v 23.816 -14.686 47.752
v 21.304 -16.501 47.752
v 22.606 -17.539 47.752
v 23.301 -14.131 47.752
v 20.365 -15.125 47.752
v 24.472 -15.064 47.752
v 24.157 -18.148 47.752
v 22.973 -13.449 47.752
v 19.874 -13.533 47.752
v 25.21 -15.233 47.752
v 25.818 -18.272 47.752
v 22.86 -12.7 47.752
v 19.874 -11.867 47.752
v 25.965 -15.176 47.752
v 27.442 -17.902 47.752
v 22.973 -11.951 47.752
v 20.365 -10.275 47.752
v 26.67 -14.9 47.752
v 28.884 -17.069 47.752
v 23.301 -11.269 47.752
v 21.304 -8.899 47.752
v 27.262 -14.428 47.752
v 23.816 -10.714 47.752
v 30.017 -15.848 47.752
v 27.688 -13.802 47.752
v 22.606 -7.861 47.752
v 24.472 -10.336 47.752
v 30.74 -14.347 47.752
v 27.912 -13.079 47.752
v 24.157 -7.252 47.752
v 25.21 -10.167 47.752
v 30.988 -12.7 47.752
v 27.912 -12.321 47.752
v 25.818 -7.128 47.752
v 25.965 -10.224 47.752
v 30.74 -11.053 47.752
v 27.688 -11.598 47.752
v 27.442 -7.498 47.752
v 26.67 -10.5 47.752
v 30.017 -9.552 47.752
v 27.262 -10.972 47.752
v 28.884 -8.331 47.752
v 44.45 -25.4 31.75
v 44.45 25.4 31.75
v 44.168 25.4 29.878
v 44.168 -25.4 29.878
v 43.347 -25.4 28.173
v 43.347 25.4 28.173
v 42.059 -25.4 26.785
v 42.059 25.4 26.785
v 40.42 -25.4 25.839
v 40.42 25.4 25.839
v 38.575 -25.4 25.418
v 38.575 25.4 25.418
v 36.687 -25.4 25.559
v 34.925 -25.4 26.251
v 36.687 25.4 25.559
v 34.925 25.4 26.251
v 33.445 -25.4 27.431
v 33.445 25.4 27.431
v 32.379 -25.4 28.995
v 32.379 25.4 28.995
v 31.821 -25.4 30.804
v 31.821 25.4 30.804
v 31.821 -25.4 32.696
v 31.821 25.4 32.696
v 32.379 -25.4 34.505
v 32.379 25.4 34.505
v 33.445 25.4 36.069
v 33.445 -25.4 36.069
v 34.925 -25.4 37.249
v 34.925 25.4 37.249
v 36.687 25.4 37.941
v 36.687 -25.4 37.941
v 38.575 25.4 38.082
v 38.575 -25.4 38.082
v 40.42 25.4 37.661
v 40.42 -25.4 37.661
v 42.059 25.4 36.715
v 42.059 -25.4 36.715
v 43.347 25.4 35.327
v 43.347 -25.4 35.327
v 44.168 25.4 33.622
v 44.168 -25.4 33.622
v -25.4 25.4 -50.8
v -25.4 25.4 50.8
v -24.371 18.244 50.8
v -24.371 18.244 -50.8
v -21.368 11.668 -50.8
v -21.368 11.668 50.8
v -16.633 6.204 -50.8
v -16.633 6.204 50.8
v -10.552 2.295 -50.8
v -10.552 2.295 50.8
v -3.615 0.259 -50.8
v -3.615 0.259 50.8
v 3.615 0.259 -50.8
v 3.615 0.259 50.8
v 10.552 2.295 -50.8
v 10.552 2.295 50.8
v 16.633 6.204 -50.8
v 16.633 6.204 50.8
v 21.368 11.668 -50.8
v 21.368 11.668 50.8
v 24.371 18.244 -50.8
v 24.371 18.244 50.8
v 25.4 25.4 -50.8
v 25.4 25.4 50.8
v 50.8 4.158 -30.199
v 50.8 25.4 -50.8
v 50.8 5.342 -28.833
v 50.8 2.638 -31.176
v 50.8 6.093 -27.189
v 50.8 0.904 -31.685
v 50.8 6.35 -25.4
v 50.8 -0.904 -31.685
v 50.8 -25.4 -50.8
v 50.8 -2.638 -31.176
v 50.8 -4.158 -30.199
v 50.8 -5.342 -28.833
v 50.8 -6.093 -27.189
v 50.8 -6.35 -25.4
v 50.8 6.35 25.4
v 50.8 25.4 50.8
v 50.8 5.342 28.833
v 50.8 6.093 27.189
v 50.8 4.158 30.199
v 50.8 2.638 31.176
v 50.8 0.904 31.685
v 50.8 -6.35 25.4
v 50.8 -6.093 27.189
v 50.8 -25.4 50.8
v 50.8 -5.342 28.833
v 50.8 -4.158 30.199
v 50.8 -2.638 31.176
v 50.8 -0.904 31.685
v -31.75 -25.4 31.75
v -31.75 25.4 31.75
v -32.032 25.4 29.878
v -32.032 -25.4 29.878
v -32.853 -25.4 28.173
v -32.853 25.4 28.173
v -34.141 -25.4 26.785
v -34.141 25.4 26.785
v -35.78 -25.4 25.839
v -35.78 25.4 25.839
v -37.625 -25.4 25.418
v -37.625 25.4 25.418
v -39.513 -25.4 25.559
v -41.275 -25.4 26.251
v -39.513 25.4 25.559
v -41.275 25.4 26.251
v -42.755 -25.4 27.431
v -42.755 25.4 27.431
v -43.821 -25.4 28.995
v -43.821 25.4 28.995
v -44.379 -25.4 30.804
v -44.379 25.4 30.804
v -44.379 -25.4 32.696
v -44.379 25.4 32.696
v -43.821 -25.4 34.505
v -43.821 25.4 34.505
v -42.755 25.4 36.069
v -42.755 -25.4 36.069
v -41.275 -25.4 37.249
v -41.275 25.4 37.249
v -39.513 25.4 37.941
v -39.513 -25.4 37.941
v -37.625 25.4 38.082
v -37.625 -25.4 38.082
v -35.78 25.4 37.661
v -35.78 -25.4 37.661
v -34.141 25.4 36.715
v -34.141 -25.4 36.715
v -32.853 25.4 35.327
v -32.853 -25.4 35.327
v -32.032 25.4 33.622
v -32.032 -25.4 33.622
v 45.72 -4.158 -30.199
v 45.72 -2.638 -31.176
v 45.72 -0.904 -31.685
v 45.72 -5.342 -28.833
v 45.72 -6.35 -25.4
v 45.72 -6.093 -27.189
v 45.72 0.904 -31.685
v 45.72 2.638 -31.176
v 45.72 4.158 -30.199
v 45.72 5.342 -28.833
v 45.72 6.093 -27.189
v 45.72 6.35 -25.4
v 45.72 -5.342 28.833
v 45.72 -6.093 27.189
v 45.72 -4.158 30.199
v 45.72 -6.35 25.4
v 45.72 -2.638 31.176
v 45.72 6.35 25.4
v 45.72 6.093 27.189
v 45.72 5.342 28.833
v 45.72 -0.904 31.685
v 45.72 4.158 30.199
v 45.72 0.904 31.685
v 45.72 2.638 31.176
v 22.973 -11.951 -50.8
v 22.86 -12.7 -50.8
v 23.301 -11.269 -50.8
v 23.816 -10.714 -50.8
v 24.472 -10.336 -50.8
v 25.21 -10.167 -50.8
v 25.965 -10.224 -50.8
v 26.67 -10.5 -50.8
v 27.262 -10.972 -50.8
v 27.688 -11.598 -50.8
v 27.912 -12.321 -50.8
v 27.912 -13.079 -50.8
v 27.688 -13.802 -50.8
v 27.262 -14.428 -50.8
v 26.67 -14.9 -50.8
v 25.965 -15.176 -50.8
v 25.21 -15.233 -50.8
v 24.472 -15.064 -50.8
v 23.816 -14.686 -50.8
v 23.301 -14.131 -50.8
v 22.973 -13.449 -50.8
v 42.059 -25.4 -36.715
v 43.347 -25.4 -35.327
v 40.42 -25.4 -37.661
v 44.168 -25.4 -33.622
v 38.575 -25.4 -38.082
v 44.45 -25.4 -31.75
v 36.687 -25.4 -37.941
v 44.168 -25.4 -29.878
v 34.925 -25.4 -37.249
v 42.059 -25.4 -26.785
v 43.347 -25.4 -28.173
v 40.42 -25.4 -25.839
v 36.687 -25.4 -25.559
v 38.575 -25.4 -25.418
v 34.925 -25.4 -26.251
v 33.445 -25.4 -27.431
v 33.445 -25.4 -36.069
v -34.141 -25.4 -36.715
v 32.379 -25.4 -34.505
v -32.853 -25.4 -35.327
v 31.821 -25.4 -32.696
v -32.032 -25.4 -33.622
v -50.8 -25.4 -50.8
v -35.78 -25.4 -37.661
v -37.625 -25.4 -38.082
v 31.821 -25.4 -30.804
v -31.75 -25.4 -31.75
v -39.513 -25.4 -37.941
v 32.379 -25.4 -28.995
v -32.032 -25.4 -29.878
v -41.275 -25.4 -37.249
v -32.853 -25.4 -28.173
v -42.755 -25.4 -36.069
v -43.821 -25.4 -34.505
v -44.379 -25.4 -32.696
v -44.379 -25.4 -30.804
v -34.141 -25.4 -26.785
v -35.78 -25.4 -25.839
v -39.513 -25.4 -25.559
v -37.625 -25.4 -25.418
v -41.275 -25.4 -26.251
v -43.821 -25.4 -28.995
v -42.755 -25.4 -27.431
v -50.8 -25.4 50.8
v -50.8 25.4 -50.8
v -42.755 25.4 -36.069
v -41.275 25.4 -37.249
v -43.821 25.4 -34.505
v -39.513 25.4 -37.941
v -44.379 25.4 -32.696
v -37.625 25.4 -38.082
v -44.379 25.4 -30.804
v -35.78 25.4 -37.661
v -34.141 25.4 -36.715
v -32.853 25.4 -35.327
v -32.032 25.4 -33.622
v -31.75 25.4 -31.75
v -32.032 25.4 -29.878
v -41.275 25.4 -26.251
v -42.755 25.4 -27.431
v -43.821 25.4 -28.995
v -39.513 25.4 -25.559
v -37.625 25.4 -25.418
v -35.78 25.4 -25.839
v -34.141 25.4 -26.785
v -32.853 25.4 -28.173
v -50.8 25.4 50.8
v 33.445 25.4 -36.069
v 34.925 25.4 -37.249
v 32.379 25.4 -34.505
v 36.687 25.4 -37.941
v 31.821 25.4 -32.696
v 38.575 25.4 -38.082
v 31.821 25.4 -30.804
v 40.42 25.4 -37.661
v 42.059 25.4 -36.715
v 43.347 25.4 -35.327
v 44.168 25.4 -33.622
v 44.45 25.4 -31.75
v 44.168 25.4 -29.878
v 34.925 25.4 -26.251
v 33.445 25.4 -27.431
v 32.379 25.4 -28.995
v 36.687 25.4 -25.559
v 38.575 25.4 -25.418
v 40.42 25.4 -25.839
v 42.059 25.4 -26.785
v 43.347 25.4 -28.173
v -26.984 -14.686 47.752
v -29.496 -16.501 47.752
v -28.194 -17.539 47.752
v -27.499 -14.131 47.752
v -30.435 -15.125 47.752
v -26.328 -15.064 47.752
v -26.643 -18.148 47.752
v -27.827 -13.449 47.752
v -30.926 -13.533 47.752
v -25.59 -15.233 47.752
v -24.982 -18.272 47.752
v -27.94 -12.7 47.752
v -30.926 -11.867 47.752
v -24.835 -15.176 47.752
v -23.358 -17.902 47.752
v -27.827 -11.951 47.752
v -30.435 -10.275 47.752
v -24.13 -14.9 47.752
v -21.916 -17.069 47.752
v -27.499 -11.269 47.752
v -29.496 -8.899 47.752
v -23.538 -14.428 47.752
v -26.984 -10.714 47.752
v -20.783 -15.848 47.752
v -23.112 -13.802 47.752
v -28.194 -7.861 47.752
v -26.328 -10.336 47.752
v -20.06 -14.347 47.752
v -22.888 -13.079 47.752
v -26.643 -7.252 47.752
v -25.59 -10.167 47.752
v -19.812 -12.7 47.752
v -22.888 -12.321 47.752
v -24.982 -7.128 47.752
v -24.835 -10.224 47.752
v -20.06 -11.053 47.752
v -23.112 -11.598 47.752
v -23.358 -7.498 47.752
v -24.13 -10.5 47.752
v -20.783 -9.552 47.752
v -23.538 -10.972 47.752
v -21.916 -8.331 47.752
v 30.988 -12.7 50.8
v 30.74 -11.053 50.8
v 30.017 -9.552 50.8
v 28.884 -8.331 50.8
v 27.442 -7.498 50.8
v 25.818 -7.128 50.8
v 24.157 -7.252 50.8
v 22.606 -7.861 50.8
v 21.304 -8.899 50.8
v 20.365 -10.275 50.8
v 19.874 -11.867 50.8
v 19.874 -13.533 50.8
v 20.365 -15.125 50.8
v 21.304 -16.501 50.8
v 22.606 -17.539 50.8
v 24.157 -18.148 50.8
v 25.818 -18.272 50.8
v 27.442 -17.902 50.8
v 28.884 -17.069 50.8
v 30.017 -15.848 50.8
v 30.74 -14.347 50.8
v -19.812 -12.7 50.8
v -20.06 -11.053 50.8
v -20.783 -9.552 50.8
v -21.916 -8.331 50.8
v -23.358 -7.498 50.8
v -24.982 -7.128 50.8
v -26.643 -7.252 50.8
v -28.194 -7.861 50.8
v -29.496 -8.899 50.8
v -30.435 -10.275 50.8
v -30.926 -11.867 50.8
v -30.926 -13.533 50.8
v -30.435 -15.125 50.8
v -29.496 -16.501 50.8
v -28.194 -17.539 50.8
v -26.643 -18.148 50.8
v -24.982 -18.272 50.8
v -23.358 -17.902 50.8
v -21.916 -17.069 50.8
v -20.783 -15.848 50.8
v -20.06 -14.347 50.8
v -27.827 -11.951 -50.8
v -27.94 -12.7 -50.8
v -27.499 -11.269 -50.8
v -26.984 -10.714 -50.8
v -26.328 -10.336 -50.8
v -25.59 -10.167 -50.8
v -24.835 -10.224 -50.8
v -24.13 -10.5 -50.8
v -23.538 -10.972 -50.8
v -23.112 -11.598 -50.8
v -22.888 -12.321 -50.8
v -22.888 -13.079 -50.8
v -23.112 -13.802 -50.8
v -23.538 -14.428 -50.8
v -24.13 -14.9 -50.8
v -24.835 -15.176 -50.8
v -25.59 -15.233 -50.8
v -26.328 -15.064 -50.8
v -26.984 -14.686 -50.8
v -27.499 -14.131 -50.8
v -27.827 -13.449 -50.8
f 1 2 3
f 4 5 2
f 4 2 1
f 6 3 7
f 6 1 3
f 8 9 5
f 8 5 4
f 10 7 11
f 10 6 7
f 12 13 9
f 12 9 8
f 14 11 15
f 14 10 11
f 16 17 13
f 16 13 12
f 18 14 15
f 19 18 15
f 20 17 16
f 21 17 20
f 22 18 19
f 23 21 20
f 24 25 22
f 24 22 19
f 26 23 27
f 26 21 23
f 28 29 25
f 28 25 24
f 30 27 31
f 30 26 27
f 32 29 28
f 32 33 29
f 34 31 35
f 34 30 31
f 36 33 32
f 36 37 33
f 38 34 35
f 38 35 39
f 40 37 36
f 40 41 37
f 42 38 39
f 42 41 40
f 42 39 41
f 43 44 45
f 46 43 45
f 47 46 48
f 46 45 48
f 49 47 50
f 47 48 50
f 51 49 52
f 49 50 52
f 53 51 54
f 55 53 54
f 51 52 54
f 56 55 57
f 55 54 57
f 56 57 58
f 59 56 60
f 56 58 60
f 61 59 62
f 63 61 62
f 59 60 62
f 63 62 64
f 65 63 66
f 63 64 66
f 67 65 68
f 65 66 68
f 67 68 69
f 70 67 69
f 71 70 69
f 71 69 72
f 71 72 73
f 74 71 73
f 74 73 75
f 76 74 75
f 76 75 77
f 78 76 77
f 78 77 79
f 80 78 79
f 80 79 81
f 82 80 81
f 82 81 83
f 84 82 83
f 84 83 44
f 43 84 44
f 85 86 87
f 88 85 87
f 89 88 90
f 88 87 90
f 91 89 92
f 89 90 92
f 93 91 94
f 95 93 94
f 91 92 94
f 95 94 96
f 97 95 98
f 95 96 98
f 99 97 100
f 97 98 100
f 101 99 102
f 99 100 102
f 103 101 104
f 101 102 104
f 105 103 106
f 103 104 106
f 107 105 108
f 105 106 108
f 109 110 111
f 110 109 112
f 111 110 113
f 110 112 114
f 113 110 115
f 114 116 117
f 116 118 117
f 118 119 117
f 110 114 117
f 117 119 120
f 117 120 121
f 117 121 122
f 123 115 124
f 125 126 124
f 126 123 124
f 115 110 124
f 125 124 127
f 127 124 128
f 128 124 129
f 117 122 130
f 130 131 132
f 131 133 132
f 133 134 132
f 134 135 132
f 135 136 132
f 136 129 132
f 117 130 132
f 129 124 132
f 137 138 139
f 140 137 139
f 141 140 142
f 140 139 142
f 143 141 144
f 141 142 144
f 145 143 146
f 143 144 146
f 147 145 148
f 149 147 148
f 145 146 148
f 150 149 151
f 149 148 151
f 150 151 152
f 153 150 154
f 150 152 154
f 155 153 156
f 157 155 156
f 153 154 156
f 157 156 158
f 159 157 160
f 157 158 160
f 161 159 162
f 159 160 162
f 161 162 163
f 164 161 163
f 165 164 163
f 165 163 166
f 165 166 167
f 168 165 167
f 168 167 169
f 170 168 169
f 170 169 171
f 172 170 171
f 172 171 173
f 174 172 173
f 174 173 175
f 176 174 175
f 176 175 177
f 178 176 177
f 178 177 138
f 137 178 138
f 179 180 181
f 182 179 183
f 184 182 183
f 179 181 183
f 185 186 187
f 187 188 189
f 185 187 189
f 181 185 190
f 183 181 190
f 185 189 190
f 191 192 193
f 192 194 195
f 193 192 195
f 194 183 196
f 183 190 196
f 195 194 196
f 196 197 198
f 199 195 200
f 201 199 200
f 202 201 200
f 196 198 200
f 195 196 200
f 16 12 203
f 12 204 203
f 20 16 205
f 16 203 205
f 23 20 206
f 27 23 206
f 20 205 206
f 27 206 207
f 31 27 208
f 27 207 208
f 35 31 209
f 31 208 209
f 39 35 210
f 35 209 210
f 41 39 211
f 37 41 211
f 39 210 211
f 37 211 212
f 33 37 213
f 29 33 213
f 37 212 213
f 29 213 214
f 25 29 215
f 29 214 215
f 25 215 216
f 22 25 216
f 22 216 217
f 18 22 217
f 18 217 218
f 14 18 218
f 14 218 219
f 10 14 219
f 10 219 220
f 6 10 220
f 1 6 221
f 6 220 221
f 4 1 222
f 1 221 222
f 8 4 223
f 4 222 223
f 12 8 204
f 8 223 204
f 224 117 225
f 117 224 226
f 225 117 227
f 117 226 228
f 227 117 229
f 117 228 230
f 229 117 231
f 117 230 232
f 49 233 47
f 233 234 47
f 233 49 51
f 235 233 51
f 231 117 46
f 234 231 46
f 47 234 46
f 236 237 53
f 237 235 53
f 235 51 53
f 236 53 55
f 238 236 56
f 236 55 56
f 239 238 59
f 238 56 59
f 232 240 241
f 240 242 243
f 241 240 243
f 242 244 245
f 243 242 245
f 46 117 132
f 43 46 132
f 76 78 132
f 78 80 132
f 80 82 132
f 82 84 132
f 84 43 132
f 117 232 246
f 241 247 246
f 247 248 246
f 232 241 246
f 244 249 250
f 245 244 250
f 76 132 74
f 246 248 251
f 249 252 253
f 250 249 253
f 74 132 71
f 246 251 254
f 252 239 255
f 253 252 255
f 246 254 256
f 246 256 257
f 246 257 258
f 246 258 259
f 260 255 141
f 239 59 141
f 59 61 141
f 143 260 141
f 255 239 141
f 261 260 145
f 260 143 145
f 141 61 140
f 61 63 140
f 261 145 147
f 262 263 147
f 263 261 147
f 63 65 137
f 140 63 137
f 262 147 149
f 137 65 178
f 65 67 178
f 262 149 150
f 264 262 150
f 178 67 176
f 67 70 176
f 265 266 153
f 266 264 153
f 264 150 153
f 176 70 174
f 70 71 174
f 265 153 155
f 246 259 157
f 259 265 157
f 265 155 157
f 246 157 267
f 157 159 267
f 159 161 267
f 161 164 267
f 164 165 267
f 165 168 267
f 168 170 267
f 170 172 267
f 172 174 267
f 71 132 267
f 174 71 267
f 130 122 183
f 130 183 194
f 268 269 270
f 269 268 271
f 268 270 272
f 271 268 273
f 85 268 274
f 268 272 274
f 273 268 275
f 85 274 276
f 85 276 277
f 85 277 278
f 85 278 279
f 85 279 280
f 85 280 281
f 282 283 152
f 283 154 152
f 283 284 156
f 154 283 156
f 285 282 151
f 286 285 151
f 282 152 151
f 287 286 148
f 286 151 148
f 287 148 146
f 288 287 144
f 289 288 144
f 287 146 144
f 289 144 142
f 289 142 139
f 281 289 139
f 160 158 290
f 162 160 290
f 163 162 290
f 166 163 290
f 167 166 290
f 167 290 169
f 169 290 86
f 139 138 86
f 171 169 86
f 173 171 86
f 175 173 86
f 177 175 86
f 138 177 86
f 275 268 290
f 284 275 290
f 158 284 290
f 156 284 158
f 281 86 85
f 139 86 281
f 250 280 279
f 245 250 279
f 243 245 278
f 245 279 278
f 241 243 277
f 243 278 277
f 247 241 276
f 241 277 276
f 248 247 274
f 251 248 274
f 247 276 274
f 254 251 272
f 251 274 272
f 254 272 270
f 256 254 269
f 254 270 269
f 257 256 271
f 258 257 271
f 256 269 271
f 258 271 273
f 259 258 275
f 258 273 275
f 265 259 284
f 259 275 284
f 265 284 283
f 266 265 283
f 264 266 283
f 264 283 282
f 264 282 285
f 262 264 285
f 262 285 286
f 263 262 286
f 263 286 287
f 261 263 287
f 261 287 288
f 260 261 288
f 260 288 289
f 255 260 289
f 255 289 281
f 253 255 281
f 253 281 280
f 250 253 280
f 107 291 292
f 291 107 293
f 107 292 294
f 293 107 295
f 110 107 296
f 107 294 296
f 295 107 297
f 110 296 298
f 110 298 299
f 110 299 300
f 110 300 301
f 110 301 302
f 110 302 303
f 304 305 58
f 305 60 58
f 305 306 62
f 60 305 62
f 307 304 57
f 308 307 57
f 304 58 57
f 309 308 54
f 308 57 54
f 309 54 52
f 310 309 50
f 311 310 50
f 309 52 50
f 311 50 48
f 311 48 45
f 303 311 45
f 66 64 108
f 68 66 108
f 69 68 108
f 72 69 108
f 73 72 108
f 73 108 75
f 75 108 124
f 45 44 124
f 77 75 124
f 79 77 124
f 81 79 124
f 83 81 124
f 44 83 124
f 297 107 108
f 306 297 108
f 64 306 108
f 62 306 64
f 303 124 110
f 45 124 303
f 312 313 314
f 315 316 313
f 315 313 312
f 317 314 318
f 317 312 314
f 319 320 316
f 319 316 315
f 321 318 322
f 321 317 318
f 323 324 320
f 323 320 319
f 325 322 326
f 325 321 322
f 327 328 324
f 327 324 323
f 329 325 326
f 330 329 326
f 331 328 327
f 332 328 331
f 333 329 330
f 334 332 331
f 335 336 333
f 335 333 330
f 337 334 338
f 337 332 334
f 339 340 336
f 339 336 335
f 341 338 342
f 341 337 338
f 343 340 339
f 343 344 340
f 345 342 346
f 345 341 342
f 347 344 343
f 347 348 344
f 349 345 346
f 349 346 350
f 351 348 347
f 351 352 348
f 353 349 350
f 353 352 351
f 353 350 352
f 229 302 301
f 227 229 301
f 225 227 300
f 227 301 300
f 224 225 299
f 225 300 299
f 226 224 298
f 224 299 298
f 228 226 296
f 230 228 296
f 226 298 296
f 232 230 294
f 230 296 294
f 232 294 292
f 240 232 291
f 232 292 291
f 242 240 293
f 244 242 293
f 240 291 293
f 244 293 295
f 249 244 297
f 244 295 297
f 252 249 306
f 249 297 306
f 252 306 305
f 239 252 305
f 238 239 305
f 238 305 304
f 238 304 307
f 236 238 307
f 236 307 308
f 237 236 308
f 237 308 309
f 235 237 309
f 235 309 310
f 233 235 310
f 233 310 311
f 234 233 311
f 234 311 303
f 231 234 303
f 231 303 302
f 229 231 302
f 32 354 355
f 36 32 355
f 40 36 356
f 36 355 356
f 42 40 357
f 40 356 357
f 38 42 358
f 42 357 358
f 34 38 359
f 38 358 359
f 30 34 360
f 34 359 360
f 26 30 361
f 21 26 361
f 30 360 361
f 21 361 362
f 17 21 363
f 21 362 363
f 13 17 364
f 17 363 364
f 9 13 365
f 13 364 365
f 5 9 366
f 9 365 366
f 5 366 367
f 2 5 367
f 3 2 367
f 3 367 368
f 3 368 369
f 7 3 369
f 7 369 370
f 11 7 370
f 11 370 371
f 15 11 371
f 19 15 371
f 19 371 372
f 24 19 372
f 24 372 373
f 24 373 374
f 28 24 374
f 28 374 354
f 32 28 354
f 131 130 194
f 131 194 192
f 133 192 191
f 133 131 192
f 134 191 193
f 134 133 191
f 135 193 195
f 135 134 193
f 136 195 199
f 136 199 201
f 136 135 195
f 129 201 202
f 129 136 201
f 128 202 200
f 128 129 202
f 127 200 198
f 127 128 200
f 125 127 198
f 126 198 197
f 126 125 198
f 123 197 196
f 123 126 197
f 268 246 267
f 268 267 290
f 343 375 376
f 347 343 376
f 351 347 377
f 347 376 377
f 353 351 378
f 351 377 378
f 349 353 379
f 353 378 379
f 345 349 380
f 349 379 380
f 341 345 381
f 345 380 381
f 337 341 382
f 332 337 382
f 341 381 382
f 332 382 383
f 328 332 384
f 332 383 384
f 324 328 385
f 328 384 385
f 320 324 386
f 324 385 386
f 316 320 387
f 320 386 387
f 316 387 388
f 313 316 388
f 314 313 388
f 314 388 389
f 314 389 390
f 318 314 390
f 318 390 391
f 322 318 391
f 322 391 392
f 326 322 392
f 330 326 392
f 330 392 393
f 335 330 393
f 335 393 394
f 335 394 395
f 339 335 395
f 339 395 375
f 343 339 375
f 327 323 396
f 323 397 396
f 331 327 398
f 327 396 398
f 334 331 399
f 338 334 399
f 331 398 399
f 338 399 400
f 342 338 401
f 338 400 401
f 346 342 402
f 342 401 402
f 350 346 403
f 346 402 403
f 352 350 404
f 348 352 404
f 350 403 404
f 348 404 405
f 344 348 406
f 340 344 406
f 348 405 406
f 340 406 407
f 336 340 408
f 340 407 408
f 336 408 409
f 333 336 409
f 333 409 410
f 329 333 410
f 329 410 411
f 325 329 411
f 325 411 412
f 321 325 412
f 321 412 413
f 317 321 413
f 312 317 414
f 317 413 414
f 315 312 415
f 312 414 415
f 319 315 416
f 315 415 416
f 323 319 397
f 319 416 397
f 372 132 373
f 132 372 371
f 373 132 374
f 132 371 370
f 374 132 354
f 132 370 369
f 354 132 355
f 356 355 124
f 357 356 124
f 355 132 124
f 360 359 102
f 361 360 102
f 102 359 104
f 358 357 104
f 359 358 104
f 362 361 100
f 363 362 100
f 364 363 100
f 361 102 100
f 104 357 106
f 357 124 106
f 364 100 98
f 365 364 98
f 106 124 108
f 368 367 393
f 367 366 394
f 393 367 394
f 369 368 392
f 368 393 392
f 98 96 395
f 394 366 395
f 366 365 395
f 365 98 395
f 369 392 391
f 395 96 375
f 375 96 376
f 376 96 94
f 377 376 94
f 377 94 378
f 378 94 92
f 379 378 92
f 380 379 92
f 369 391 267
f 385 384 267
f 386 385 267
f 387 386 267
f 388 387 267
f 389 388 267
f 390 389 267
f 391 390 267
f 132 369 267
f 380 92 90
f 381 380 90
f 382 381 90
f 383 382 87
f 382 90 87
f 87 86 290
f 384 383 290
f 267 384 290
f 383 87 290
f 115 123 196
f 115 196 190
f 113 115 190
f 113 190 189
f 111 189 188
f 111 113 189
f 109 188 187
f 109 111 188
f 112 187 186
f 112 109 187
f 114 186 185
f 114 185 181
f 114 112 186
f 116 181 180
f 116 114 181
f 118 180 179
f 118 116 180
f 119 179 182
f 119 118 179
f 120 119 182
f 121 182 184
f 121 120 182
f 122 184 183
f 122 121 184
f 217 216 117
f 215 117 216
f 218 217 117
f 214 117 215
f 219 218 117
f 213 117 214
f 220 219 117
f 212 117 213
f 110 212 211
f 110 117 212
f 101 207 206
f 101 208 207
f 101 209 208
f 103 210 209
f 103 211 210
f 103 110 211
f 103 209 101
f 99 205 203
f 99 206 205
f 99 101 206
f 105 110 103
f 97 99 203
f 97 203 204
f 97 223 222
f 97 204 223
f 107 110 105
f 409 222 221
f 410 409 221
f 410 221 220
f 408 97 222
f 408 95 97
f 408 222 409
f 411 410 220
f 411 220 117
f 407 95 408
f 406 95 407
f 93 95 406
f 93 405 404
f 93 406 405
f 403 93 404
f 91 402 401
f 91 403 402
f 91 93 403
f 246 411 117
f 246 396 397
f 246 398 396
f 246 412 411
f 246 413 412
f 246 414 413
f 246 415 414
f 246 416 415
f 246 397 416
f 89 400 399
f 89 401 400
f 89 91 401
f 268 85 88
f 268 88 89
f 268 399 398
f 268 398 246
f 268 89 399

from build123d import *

# Parameters (mm, degrees)
BOSS_EXTRUDE1_DEPTH                                 = 50.8
SKETCH2_R                                           = 6.35
CUT_EXTRUDE1_DEPTH                                  = 51.8
LPATTERN1_COUNT                                     = 2
LPATTERN1_PITCH                                     = 76.2
LPATTERN1_COUNT_DIR2                                = 2
LPATTERN1_PITCH_DIR2                                = 63.5
CBORE_FOR_00_BINDING_HEAD_MACHINE_SCREW_D           = 5.08
CBORE_FOR_00_BINDING_HEAD_MACHINE_SCREW_CBORE_D     = 11.176
CBORE_FOR_00_BINDING_HEAD_MACHINE_SCREW_CBORE_DEPTH = 3.048
CUT_EXTRUDE6_DEPTH                                  = 5.08


with BuildPart() as part:
    # Sketch1 → Boss-Extrude1 (new body, symmetric)
    with BuildSketch(Plane.XY):
        with BuildLine():
            Line((25.4, 25.4), (50.8, 25.4))
            Line((50.8, 25.4), (50.8, -25.4))
            Line((50.8, -25.4), (-50.8, -25.4))
            Line((-50.8, -25.4), (-50.8, 25.4))
            Line((-50.8, 25.4), (-25.4, 25.4))
            ThreePointArc((-25.4, 25.4), (0, 0), (25.4, 25.4))
        make_face()
    extrude(amount=BOSS_EXTRUDE1_DEPTH, both=True)

    # Sketch2 → Cut-Extrude1 (cut, through all)
    with BuildSketch(Plane(origin=(0, 25.4, 0), x_dir=(1, 0, 0), z_dir=(0, 1, 0))):
        with Locations((-38.1, 31.75)):
            Circle(SKETCH2_R)
    cut_extrude1 = extrude(amount=-CUT_EXTRUDE1_DEPTH, mode=Mode.SUBTRACT)

    # LPattern1: Cut-Extrude1 2 × 2
    with Locations(*[(i * LPATTERN1_PITCH, 0, j * LPATTERN1_PITCH_DIR2) for i in range(LPATTERN1_COUNT) for j in range(LPATTERN1_COUNT_DIR2) if (i, j) != (0, 0)]):
        add(cut_extrude1, mode=Mode.SUBTRACT)

    # CBORE for #00 Binding Head Machine Screw1 (through all)
    with Locations(Plane.XY.offset(50.8)):
        with Locations((-25.4, -12.7), (25.4, -12.7)):
            CounterBoreHole(CBORE_FOR_00_BINDING_HEAD_MACHINE_SCREW_D / 2, CBORE_FOR_00_BINDING_HEAD_MACHINE_SCREW_CBORE_D / 2, CBORE_FOR_00_BINDING_HEAD_MACHINE_SCREW_CBORE_DEPTH)

    # Sketch7 → Cut-Extrude6 (cut)
    with BuildSketch(Plane(origin=(50.8, 0, 0), x_dir=(0, 0, -1), z_dir=(1, 0, 0))):
        with BuildLine():
            Line((-25.4, 6.35), (25.4, 6.35))
            ThreePointArc((25.4, 6.35), (31.75, 0), (25.4, -6.35))
            Line((25.4, -6.35), (-25.4, -6.35))
            ThreePointArc((-25.4, -6.35), (-31.75, 0), (-25.4, 6.35))
        make_face()
    extrude(amount=-CUT_EXTRUDE6_DEPTH, mode=Mode.SUBTRACT)


solid = part.part
